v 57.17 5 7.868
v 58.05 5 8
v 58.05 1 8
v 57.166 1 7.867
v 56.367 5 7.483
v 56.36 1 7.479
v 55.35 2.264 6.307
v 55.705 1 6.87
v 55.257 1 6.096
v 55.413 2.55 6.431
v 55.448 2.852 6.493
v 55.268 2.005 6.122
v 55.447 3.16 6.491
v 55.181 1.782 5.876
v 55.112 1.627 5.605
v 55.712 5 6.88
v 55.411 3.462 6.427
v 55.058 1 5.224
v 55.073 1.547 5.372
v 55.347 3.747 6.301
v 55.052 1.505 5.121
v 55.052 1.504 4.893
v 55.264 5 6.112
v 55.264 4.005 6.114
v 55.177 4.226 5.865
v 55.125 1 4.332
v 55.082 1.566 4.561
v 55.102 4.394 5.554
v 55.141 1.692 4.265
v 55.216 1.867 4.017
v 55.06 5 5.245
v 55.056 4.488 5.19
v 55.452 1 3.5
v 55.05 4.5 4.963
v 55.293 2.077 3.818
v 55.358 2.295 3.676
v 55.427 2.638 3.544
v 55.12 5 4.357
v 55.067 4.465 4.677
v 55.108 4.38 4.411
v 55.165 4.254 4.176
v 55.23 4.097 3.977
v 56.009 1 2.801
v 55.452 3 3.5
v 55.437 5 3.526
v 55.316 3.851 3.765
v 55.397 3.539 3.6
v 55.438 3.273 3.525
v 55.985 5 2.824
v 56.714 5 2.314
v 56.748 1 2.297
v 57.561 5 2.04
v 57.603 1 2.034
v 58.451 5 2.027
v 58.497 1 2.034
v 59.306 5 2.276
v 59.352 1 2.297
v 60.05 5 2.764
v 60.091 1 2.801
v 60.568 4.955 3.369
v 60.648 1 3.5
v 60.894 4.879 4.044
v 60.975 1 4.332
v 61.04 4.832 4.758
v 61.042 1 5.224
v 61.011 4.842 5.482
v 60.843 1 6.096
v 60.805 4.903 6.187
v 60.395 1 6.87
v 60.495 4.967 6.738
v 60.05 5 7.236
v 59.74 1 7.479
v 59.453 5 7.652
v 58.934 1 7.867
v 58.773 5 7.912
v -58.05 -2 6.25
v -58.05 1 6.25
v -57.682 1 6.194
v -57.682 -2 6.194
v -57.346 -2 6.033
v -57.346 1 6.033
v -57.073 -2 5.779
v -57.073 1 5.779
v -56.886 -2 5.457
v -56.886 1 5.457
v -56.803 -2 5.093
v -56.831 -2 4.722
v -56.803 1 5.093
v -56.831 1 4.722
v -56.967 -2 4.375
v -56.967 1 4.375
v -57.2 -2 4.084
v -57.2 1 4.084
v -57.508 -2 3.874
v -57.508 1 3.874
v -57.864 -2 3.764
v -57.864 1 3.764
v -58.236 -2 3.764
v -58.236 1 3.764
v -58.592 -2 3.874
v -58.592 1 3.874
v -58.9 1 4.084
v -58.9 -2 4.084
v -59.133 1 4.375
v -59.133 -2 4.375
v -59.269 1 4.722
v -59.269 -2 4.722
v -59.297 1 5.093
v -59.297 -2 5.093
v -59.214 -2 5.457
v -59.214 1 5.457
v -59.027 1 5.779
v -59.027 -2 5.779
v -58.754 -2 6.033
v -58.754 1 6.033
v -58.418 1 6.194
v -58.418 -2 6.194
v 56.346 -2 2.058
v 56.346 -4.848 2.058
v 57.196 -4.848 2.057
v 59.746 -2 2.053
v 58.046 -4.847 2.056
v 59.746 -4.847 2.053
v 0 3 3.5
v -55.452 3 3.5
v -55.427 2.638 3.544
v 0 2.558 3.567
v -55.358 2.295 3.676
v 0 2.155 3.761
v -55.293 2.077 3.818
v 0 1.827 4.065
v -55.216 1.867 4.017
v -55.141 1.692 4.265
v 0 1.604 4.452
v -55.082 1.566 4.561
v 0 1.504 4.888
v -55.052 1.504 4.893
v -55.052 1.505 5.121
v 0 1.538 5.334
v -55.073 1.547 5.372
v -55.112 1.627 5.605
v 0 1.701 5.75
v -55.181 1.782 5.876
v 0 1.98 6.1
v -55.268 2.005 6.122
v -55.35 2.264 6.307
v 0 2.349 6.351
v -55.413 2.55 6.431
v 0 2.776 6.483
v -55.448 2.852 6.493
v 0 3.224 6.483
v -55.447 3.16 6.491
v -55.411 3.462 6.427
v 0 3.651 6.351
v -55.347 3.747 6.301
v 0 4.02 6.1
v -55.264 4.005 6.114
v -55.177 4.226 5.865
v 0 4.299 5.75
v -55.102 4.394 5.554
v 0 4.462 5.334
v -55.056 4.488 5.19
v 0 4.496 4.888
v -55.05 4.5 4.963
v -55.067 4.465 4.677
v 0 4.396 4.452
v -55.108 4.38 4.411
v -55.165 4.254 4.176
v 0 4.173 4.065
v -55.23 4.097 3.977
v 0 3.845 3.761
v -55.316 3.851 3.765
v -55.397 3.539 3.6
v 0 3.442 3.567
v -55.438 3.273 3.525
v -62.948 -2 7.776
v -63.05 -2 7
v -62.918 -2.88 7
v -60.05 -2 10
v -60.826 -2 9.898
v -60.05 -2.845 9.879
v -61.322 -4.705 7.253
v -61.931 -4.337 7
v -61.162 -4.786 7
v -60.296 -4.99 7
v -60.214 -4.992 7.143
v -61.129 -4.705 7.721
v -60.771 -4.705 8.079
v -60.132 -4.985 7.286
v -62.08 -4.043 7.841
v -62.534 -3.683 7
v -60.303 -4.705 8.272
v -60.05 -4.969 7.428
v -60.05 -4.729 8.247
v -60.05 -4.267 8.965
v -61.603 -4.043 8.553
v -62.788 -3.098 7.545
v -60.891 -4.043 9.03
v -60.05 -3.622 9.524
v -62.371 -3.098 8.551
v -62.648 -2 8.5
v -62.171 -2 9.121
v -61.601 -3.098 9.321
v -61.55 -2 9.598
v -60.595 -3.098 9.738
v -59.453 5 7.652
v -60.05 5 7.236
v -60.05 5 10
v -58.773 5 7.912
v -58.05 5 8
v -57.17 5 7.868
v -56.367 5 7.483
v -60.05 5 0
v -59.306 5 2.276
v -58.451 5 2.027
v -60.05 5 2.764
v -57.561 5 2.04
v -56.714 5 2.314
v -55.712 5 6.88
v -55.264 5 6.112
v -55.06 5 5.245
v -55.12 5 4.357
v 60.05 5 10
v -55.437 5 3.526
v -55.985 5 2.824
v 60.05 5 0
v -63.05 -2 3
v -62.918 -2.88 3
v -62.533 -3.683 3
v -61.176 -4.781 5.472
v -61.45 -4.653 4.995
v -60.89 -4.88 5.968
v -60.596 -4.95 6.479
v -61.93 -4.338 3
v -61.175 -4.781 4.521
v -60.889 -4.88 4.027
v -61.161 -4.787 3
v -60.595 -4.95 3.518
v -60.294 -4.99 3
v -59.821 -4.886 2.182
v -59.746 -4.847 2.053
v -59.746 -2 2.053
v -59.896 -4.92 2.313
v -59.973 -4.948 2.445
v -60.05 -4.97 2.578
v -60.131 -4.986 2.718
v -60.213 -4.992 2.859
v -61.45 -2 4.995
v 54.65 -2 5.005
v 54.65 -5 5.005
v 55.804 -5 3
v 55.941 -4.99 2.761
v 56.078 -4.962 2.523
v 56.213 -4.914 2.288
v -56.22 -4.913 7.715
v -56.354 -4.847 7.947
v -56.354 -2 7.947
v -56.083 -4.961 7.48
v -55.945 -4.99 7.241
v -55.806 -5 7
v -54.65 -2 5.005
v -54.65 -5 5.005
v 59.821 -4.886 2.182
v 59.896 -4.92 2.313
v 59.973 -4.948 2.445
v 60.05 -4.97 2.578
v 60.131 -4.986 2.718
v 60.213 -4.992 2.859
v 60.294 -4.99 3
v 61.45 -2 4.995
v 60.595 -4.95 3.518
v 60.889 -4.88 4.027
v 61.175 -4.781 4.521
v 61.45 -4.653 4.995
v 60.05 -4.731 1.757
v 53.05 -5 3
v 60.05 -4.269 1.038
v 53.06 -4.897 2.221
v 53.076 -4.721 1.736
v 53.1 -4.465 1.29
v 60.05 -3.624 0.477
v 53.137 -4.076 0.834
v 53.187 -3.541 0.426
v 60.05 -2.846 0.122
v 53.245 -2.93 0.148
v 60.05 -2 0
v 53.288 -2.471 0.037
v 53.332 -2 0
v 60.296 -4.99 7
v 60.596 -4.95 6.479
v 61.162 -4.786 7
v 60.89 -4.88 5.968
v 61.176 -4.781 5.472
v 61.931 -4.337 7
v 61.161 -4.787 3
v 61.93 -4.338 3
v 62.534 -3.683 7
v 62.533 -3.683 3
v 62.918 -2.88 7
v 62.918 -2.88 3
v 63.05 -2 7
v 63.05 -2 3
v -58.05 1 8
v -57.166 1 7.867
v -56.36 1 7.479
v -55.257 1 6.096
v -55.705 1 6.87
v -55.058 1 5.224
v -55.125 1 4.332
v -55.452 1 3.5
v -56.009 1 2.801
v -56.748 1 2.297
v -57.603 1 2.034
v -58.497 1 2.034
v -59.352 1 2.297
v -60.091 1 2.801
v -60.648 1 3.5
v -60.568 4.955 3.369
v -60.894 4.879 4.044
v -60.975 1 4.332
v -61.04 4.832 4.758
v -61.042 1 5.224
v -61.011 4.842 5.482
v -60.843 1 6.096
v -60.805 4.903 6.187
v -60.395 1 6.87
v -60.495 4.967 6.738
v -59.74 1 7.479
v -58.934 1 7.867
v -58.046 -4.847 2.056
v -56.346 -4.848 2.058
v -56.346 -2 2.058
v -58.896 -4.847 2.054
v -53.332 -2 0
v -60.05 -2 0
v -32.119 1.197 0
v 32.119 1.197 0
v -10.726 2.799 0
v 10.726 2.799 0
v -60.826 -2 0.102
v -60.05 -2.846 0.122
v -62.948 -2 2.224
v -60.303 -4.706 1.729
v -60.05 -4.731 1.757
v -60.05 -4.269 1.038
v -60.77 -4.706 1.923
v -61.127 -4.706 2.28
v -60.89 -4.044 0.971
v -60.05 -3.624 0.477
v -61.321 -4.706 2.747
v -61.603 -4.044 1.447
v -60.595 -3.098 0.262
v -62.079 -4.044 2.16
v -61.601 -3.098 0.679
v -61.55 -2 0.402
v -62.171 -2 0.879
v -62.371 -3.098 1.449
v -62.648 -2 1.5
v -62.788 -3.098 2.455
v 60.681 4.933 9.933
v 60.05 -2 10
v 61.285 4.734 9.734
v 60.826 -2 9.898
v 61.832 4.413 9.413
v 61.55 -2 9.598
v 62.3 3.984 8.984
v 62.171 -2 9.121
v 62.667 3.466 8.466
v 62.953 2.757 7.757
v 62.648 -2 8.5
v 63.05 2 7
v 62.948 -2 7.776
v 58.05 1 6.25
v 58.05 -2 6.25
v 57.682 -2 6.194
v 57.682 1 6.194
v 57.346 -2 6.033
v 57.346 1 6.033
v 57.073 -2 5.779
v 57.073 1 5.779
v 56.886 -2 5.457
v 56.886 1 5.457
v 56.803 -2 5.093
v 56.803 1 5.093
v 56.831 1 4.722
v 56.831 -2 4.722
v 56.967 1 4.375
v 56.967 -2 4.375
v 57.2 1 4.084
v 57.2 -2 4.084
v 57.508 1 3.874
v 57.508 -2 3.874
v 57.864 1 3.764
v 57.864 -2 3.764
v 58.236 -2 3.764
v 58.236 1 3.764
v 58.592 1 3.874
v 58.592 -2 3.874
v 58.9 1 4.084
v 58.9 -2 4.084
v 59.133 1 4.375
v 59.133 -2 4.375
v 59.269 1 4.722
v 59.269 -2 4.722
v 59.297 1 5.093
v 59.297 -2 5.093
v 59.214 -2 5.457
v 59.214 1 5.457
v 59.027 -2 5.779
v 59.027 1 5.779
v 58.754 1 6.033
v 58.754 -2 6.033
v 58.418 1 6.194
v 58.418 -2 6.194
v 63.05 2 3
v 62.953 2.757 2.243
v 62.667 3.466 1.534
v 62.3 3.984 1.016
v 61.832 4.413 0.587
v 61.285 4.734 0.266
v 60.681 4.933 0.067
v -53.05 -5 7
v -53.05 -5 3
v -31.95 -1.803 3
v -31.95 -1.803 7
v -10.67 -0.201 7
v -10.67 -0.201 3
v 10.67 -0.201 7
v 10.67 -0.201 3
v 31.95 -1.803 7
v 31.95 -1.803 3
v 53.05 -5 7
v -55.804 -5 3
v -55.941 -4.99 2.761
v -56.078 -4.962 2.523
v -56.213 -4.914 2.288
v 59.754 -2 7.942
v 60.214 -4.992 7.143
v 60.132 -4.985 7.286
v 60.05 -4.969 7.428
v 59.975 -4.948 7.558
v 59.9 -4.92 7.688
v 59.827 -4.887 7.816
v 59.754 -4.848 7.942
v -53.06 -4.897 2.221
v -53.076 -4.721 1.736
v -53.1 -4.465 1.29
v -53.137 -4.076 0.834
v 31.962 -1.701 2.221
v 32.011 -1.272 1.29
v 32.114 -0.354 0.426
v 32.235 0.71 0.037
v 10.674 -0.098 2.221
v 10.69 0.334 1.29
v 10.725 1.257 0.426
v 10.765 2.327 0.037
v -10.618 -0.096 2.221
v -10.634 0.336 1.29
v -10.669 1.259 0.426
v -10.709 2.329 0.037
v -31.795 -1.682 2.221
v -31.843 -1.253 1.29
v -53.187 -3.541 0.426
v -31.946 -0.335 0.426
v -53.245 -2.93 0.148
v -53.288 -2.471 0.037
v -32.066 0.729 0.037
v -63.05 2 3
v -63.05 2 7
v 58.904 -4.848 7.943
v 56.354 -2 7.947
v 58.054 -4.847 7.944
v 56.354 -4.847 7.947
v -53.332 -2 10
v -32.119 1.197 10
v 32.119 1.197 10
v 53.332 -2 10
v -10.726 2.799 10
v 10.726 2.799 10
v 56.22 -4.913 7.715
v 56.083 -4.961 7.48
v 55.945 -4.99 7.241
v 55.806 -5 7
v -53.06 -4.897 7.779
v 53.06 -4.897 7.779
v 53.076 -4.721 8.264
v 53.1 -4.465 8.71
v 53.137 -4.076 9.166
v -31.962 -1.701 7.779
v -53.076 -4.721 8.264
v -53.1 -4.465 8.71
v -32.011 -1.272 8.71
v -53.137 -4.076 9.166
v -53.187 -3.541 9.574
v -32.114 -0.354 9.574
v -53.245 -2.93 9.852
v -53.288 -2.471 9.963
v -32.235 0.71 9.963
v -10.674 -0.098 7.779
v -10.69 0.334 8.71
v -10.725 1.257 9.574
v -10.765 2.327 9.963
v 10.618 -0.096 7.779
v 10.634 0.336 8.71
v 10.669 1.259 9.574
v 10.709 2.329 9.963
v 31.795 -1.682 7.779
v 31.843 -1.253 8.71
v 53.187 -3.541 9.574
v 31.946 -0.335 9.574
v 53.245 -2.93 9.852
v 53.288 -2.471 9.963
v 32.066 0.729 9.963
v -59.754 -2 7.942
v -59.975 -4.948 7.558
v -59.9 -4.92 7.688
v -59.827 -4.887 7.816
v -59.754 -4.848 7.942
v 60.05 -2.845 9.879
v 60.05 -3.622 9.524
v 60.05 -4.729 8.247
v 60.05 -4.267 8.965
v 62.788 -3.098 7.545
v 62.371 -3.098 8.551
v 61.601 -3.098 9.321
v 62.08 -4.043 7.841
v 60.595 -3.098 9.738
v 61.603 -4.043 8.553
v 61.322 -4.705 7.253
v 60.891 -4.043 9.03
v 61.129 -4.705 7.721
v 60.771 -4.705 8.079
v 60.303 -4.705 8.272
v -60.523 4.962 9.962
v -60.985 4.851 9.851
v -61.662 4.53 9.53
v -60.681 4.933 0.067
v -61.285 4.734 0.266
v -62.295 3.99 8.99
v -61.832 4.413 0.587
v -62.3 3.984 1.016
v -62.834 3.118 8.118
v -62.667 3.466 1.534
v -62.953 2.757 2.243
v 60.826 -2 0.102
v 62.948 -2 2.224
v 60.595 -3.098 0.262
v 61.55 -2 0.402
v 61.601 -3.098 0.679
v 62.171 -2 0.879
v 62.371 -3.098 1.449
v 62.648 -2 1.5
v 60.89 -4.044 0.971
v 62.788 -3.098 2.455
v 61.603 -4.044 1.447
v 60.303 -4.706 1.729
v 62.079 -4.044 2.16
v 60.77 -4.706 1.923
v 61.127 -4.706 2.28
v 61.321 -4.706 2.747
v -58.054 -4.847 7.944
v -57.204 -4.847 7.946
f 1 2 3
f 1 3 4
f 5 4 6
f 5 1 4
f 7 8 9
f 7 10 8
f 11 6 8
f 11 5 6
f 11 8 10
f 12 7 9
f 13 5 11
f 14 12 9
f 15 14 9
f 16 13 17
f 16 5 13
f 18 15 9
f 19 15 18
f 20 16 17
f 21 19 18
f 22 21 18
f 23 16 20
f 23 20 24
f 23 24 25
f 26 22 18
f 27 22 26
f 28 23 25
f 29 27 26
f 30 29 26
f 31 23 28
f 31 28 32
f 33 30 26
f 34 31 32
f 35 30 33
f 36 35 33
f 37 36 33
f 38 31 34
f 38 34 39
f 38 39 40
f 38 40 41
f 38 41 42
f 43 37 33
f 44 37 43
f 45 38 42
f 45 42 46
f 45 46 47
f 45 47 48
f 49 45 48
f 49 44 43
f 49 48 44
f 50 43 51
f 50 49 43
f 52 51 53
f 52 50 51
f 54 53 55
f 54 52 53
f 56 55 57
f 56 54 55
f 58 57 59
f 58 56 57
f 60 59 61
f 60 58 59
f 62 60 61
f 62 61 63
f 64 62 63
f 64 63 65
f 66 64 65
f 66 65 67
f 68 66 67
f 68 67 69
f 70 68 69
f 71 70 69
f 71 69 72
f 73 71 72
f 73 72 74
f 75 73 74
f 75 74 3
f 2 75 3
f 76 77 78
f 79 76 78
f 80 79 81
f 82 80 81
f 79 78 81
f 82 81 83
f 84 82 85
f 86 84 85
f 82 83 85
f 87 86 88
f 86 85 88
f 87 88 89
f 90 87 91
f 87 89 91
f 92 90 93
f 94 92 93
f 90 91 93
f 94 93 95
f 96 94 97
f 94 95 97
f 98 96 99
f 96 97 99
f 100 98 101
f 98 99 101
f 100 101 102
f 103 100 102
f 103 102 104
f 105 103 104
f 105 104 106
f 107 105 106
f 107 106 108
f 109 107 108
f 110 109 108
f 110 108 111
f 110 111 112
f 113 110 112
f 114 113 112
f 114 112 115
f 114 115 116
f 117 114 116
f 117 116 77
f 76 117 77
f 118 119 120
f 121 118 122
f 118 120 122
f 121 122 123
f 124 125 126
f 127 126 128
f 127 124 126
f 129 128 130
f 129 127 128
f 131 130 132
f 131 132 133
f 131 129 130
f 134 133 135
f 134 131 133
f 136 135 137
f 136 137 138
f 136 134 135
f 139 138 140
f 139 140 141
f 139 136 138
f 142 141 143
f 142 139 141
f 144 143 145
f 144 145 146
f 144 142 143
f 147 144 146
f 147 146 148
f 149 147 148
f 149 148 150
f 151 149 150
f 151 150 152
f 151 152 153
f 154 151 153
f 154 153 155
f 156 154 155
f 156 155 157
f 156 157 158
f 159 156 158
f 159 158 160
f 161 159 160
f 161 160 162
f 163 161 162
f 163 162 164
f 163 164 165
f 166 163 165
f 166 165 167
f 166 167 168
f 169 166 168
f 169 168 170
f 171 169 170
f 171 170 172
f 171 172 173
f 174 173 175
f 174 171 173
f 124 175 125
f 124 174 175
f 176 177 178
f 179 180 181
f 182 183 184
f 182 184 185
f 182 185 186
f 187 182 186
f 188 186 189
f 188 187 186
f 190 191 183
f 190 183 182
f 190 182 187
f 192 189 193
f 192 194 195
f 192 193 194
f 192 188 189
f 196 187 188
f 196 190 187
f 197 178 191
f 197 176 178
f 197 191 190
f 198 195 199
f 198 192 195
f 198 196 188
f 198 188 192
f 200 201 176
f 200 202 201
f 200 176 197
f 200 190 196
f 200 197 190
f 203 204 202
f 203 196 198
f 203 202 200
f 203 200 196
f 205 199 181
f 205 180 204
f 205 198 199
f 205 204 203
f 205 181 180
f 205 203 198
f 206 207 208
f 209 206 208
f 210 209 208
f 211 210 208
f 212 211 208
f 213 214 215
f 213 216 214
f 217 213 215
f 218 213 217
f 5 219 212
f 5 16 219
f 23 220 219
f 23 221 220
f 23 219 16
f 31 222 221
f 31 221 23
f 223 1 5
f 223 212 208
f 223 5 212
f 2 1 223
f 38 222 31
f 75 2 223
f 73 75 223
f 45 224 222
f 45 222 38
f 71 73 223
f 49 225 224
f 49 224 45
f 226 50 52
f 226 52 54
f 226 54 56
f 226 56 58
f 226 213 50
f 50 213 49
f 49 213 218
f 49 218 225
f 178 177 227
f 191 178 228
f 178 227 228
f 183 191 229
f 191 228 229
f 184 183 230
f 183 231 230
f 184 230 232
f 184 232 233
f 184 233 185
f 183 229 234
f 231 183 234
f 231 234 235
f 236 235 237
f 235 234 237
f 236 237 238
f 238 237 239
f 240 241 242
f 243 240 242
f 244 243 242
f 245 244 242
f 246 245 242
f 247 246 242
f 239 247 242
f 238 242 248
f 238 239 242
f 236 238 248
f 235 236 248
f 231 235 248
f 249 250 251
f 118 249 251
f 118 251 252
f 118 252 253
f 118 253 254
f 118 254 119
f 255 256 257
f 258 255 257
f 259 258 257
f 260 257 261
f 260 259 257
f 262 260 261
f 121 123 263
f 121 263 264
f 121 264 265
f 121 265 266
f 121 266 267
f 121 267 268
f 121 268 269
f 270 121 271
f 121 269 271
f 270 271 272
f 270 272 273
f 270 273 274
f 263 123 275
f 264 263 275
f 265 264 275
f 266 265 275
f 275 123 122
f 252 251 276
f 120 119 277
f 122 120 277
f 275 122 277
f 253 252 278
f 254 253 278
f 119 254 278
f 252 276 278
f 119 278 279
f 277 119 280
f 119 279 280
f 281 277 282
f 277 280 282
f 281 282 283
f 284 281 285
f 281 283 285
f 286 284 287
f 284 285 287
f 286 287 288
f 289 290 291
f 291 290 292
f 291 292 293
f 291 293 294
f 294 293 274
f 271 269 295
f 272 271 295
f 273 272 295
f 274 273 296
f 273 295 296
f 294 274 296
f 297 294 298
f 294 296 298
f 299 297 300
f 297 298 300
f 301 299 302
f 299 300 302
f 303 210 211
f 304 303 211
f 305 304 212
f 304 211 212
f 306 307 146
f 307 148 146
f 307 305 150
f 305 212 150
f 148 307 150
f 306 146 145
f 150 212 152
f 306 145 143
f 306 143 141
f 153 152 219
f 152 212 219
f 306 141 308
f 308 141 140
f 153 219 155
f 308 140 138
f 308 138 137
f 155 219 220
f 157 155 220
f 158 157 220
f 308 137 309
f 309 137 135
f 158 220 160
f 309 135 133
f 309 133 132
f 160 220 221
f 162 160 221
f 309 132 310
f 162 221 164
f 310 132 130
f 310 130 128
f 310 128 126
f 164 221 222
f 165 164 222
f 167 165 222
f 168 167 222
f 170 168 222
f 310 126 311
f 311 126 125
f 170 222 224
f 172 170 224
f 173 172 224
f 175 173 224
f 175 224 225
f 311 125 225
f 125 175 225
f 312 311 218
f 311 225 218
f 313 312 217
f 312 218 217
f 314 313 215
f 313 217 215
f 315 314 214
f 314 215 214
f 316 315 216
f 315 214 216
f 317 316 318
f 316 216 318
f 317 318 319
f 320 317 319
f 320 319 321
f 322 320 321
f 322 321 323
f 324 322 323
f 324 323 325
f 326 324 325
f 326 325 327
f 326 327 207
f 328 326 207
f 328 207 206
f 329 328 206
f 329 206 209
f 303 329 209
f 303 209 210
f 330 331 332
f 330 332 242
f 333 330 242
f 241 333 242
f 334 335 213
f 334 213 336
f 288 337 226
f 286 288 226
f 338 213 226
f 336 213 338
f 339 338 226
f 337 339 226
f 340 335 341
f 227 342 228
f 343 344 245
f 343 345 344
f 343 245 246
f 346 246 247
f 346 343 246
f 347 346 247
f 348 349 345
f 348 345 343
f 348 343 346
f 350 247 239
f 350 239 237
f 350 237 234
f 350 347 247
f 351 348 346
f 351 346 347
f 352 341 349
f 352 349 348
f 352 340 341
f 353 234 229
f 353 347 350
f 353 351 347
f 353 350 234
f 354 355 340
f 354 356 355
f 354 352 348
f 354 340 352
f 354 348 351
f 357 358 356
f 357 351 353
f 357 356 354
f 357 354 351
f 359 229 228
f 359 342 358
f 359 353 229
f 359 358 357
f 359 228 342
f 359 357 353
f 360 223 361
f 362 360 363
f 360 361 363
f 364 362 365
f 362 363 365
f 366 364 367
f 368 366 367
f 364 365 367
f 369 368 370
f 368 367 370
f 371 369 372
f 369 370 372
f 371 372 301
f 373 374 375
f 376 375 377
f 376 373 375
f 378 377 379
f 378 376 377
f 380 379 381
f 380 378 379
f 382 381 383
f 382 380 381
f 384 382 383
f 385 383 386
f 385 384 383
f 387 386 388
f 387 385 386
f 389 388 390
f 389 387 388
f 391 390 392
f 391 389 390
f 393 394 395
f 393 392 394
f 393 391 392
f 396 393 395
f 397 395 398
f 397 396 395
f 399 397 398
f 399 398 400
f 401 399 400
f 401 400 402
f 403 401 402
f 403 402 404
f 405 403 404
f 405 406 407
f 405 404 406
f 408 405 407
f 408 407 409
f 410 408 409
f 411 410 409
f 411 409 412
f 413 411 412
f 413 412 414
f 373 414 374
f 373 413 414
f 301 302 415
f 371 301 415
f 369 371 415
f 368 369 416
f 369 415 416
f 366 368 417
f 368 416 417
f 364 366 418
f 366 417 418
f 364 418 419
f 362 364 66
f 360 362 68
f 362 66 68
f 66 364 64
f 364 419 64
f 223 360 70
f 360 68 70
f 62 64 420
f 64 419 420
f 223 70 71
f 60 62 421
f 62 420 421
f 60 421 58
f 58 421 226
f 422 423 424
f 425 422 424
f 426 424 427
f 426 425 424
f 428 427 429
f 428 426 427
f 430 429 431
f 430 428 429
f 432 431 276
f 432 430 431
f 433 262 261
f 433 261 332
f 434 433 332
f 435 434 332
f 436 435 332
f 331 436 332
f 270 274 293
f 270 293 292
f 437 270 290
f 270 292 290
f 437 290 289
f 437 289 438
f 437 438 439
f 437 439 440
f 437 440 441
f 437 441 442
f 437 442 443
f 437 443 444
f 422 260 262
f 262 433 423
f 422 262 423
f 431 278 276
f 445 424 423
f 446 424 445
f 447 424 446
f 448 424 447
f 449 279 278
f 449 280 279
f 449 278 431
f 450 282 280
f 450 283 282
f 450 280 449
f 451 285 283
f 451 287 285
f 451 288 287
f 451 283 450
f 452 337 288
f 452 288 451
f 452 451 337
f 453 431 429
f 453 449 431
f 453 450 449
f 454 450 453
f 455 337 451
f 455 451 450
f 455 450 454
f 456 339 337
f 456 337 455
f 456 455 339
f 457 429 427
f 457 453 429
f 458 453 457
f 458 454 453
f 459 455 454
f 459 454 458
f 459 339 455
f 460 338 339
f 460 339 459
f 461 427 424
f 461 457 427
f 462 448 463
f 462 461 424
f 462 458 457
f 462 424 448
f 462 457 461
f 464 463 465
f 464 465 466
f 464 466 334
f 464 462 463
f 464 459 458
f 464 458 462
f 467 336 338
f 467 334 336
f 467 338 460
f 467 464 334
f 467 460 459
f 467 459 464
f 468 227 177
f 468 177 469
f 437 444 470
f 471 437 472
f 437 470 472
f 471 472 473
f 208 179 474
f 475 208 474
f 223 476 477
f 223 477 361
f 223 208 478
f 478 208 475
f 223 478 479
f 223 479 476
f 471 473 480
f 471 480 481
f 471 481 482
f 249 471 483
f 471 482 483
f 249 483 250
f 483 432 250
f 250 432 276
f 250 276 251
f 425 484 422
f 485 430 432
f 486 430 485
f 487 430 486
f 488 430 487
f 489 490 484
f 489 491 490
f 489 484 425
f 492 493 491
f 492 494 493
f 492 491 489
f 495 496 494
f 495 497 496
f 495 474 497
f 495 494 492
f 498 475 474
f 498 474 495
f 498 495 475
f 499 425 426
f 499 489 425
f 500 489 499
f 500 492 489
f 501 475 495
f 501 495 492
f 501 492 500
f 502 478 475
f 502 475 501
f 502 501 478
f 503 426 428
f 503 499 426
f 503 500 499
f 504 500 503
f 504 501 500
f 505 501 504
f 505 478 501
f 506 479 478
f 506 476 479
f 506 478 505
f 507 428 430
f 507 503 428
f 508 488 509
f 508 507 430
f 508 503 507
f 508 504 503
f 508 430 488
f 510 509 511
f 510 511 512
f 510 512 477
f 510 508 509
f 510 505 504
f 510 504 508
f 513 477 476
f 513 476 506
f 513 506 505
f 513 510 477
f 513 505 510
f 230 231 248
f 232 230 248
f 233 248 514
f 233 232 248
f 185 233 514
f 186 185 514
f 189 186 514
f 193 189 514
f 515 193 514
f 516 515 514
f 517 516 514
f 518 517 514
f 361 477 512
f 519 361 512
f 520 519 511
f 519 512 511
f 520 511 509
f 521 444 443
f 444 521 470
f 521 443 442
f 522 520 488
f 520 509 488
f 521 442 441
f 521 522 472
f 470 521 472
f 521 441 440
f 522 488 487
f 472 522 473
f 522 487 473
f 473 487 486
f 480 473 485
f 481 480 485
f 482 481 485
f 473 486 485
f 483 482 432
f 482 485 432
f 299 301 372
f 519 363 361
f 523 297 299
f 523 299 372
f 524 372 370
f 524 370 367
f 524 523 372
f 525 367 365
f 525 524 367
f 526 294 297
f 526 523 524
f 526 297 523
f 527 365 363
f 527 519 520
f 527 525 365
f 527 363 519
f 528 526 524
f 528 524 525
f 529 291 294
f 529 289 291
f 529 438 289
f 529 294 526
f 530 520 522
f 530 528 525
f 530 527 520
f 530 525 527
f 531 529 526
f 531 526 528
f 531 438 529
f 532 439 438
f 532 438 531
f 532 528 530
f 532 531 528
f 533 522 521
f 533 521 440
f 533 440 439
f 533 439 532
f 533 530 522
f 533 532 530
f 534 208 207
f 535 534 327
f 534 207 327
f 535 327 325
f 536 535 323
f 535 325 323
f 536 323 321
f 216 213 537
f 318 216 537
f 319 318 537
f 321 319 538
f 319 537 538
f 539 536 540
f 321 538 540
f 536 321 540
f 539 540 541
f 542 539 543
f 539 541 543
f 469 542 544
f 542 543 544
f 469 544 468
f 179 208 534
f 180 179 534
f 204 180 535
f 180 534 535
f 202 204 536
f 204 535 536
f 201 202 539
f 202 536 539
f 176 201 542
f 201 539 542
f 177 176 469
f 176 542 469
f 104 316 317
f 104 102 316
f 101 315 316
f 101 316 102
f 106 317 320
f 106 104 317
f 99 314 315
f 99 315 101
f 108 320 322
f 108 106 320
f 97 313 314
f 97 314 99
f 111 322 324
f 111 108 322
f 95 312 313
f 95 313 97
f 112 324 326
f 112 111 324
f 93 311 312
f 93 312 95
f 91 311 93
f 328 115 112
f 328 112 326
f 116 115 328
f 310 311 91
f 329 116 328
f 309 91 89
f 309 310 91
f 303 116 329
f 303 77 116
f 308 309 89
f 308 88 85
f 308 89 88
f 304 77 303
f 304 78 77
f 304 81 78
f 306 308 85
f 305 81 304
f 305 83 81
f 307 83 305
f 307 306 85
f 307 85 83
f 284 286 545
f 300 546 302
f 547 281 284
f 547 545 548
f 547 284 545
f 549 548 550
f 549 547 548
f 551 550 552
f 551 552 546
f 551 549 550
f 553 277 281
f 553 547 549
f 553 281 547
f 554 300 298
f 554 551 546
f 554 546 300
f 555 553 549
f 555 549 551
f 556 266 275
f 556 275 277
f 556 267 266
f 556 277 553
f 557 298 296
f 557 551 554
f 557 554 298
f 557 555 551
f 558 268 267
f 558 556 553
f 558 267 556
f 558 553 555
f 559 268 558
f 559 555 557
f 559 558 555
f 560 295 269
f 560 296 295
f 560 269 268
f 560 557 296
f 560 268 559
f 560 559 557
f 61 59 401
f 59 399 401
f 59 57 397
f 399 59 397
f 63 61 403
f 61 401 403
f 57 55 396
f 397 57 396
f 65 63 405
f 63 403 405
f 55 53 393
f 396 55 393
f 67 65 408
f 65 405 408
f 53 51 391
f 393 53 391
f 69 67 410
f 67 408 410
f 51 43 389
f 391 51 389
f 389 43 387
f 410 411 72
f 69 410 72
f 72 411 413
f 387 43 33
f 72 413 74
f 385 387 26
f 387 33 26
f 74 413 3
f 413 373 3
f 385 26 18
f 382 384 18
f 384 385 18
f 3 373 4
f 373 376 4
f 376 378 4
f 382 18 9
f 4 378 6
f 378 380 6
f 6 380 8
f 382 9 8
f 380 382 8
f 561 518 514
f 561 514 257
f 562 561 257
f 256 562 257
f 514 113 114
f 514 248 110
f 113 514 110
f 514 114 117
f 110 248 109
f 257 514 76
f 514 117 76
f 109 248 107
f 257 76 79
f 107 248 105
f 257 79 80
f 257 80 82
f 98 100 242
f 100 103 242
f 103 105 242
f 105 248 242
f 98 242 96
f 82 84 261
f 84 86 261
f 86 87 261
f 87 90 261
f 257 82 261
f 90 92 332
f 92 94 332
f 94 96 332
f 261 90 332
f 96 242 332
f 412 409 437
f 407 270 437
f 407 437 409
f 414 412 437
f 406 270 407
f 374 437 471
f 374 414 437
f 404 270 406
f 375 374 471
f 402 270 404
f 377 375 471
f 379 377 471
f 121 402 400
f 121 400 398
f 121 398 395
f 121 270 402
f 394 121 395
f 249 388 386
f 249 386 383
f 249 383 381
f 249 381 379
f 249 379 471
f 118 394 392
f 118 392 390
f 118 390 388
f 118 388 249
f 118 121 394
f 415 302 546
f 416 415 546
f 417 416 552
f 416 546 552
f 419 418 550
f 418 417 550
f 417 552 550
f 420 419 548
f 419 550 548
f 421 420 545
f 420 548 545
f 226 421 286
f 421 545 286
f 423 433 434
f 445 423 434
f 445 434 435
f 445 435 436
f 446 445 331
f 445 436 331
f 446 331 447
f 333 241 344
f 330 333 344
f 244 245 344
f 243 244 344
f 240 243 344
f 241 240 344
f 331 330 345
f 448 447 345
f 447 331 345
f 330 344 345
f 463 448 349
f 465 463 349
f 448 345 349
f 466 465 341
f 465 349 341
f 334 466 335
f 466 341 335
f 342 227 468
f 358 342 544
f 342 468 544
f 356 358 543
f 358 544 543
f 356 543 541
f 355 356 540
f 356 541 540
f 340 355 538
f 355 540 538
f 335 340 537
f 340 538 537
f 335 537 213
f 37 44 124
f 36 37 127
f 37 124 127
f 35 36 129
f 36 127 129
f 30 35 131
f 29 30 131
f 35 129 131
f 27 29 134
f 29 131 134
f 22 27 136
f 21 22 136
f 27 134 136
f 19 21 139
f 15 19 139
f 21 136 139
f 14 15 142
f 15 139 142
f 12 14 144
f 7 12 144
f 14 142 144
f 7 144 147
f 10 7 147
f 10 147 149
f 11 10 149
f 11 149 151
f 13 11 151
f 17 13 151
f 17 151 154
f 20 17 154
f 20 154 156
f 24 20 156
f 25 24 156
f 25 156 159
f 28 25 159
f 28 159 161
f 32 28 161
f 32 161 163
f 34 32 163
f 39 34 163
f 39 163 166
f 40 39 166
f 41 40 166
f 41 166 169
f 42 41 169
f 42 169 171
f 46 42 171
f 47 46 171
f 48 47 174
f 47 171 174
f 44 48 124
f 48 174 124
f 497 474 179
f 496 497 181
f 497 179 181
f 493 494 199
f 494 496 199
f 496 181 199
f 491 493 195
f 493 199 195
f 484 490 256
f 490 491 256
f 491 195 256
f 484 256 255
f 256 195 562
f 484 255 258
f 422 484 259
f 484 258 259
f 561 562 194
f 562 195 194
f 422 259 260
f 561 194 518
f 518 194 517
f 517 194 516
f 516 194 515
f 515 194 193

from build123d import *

# Parameters (mm, degrees)
ESBO_O1_W                              = 126.1
ESBO_O1_H                              = 10
RESSALTO_EXTRUS_O1_DEPTH               = 10
CORTE_EXTRUS_O1_DEPTH                  = 65.033604459
CORTE_EXTRUS_O3_DEPTH                  = 3
ESBO_O4_R                              = 3
CORTE_EXTRUS_O4_DEPTH                  = 4
ESBO_O5_R                              = 1.25
CORTE_EXTRUS_O5_DEPTH                  = 65.11943933
CORTE_EXTRUS_O9_REACH                  = 66.034
CORTE_EXTRUS_O9_END_RADIUS             = 3
ESBO_O6_R                              = 1.5
CORTE_EXTRUS_O9_DIRECTION_2_REACH      = 66.034
CORTE_EXTRUS_O9_DIRECTION_2_END_RADIUS = 3
FILETE1_R                              = 3
FILETE2_R                              = 3


with BuildPart() as part:
    # Esboço1 → Ressalto-extrusão1 (new body)
    with BuildSketch(Plane.XY):
        Rectangle(ESBO_O1_W, ESBO_O1_H)
    extrude(amount=RESSALTO_EXTRUS_O1_DEPTH)

    # Esboço2 → Corte-extrusão1 (cut, through all)
    with BuildSketch(Plane.XY.offset(10)):
        with BuildLine():
            Line((-291.82946292, -50.413684991), (-53.05, -5))
            ThreePointArc((-53.05, -5), (0, 0), (53.05, -5))
            Line((53.05, -5), (291.82946292, -50.413684991))
            Line((291.82946292, -50.413684991), (291.82946292, -536.533154655))
            Line((291.82946292, -536.533154655), (-291.82946292, -536.533154655))
            Line((-291.82946292, -536.533154655), (-291.82946292, -50.413684991))
        make_face()
    extrude(amount=-CORTE_EXTRUS_O1_DEPTH, mode=Mode.SUBTRACT)

    # Esboço3 → Corte-extrusão3 (cut)
    with BuildSketch(Plane(origin=(0, -5, 0), x_dir=(1, 0, 0), z_dir=(0, 1, 0))):
        Polygon((-56.354018507, -7.946802806), (-54.650003164, -5.004638346), (-56.345984657, -2.05783554), (-59.745981493, -2.053197194), (-61.449996836, -4.995361654), (-59.754015343, -7.94216446), align=None)
    corte_extrus_o3 = extrude(amount=CORTE_EXTRUS_O3_DEPTH, mode=Mode.SUBTRACT)

    # Esboço4 → Corte-extrusão4 (cut)
    with BuildSketch(Plane(origin=(0, 5, 0), x_dir=(1, 0, 0), z_dir=(0, 1, 0))):
        with Locations(Location((-58.05, -5, 0), (0, 0, 270))):
            Circle(ESBO_O4_R)
    corte_extrus_o4 = extrude(amount=-CORTE_EXTRUS_O4_DEPTH, mode=Mode.SUBTRACT)

    # Esboço5 → Corte-extrusão5 (cut, through all)
    with BuildSketch(Plane(origin=(0, 1, 0), x_dir=(1, 0, 0), z_dir=(0, 1, 0))):
        with Locations(Location((-58.05, -5, 0), (0, 0, 270))):
            Circle(ESBO_O5_R)
    corte_extrus_o5 = extrude(amount=-CORTE_EXTRUS_O5_DEPTH, mode=Mode.SUBTRACT)

    # Espelhar2: Corte-extrusão3, Corte-extrusão4, Corte-extrusão5 across plane
    add(corte_extrus_o3.mirror(Plane(origin=(0, 0, 0), x_dir=(0, 0, 1), z_dir=(1, 0, 0))), mode=Mode.SUBTRACT)
    add(corte_extrus_o4.mirror(Plane(origin=(0, 0, 0), x_dir=(0, 0, 1), z_dir=(1, 0, 0))), mode=Mode.SUBTRACT)
    add(corte_extrus_o5.mirror(Plane(origin=(0, 0, 0), x_dir=(0, 0, 1), z_dir=(1, 0, 0))), mode=Mode.SUBTRACT)

    # Corte-extrusão9: up to this cylinder (the profile starts outside it)
    corte_extrus_o9_end = Plane(origin=(58.05, 3, 5), z_dir=(0, 1, 0)) * Cylinder(CORTE_EXTRUS_O9_END_RADIUS, 139.068, mode=Mode.PRIVATE)
    # Esboço6 → Corte-extrusão9 (cut, up to the surface)
    with BuildSketch(Plane.ZY, mode=Mode.PRIVATE) as corte_extrus_o9_sk1:
        with Locations(Location((5, 3, 0), (0, 0, 180))):
            Circle(ESBO_O6_R)
    corte_extrus_o9_tool1 = extrude(corte_extrus_o9_sk1.sketch, amount=-CORTE_EXTRUS_O9_REACH, mode=Mode.PRIVATE) - corte_extrus_o9_end
    add(corte_extrus_o9_tool1.solids().sort_by_distance((0, 3, 5))[0], mode=Mode.SUBTRACT)

    # Corte-extrusão9 direction 2: up to this cylinder (the profile starts outside it)
    corte_extrus_o9_direction_2_end = Plane(origin=(-58.05, 3, 5), z_dir=(0, 1, 0)) * Cylinder(CORTE_EXTRUS_O9_DIRECTION_2_END_RADIUS, 139.068, mode=Mode.PRIVATE)
    # Esboço6 → Corte-extrusão9 direction 2 (cut, up to the surface)
    with BuildSketch(Plane.ZY, mode=Mode.PRIVATE) as corte_extrus_o9_direction_2_sk1:
        with Locations(Location((5, 3, 0), (0, 0, 180))):
            Circle(ESBO_O6_R)
    corte_extrus_o9_direction_2_tool1 = extrude(corte_extrus_o9_direction_2_sk1.sketch, amount=CORTE_EXTRUS_O9_DIRECTION_2_REACH, mode=Mode.PRIVATE) - corte_extrus_o9_direction_2_end
    add(corte_extrus_o9_direction_2_tool1.solids().sort_by_distance((0, 3, 5))[0], mode=Mode.SUBTRACT)

    # Filete1
    # the kernel refuses this fillet: 3 mm, written as the material it takes off along each edge
    with BuildSketch(Plane(origin=(-63.05, 12.5, 10), x_dir=(1, 0, 0), z_dir=(0, -1, 0)), Plane(origin=(-63.05, 12.5, 0), x_dir=(0, 0, 1), z_dir=(0, -1, 0)), Plane(origin=(63.05, -12.5, 0), x_dir=(0, 0, 1), z_dir=(0, 1, 0)), Plane(origin=(-63.05, 5, -7.5), x_dir=(1, 0, 0), z_dir=(0, 0, 1)), Plane(origin=(63.05, 5, -7.5), x_dir=(0, -1, 0), z_dir=(0, 0, 1))) as filete1_piece_1:
        with BuildLine():
            CenterArc((FILETE1_R, -FILETE1_R), FILETE1_R, 90, 90)
            Line((0, -FILETE1_R), (0, 0))
            Line((0, 0), (FILETE1_R, 0))
        make_face()
    extrude(amount=25, mode=Mode.SUBTRACT)
    with BuildSketch(Plane(origin=(63.05, -12.5, 10), x_dir=(0, 0, -1), z_dir=(0, 1, 0))) as filete1_piece_2:
        with BuildLine():
            CenterArc((FILETE1_R, FILETE1_R), FILETE1_R, 180, 90)
            Line((0, FILETE1_R), (0, 0))
            Line((0, 0), (FILETE1_R, 0))
        make_face()
    extrude(amount=25, mode=Mode.SUBTRACT)

    # Filete2
    # the kernel refuses this fillet: 3 mm, written as the material it takes off along each edge
    with BuildSketch(Plane(origin=(45.55, -5, 0), x_dir=(0, 1, 0), z_dir=(1, 0, 0)), Plane(origin=(-60.05, -5, 10), x_dir=(0, 0, -1), z_dir=(1, 0, 0))) as filete2_piece_1:
        with BuildLine():
            CenterArc((FILETE2_R, FILETE2_R), FILETE2_R, 180, 90)
            Line((0, FILETE2_R), (0, 0))
            Line((0, 0), (FILETE2_R, 0))
        make_face()
    extrude(amount=14.5, mode=Mode.SUBTRACT)
    with BuildSketch(Plane(origin=(45.55, -5, 10), x_dir=(0, 1, 0), z_dir=(1, 0, 0)), Plane(origin=(-60.05, -5, 0), x_dir=(0, 0, 1), z_dir=(1, 0, 0))) as filete2_piece_2:
        with BuildLine():
            CenterArc((FILETE2_R, -FILETE2_R), FILETE2_R, 90, 90)
            Line((0, -FILETE2_R), (0, 0))
            Line((0, 0), (FILETE2_R, 0))
        make_face()
    extrude(amount=14.5, mode=Mode.SUBTRACT)
    with BuildSketch(Plane(origin=(0, -283.93025, 0), x_dir=(0.21272383034714434, 0.9771123640617998, 0), z_dir=(0.9771123640617998, -0.21272383034714434, 0))) as filete2_piece_3:
        with BuildLine():
            CenterArc((283.93025 + FILETE2_R, FILETE2_R), FILETE2_R, 180, 90)
            Line((283.93025, FILETE2_R), (283.93025, 0))
            Line((283.93025, 0), (283.93025 + FILETE2_R, 0))
        make_face()
    revolve(axis=Axis((0, -283.93025, 0), (0, 0, 1)), revolution_arc=24.564047203, mode=Mode.SUBTRACT)
    with BuildSketch(Plane(origin=(0, -283.93025, 10), x_dir=(-0.21272383034714376, 0.9771123640618, 0), z_dir=(-0.9771123640618, -0.21272383034714376, 0))) as filete2_piece_4:
        with BuildLine():
            CenterArc((283.93025 + FILETE2_R, FILETE2_R), FILETE2_R, 180, 90)
            Line((283.93025 + FILETE2_R, 0), (283.93025, 0))
            Line((283.93025, 0), (283.93025, FILETE2_R))
        make_face()
    revolve(axis=Axis((0, -283.93025, 10), (0, 0, -1)), revolution_arc=24.564047203, mode=Mode.SUBTRACT)
    with BuildSketch(Plane(origin=(-60.05, -5, 3), x_dir=(0, 0, -1), z_dir=(1, 0, 0))) as filete2_piece_5:
        with BuildLine():
            CenterArc((3 - FILETE2_R, FILETE2_R), FILETE2_R, 270, 90)
            Line((3, FILETE2_R), (3, 0))
            Line((3, 0), (3 - FILETE2_R, 0))
        make_face()
    revolve(axis=Axis((-60.05, -5, 3), (0, 1, 0)), revolution_arc=90, mode=Mode.SUBTRACT)
    with BuildSketch(Plane(origin=(-63.05, -5, 3), x_dir=(1, 0, 0), z_dir=(0, 0, 1))) as filete2_piece_6:
        with BuildLine():
            CenterArc((FILETE2_R, FILETE2_R), FILETE2_R, 180, 90)
            Line((0, FILETE2_R), (0, 0))
            Line((0, 0), (FILETE2_R, 0))
        make_face()
    extrude(amount=4, mode=Mode.SUBTRACT)
    with BuildSketch(Plane(origin=(-60.05, -5, 7), x_dir=(-1, 0, 0), z_dir=(0, 0, -1))) as filete2_piece_7:
        with BuildLine():
            CenterArc((3 - FILETE2_R, FILETE2_R), FILETE2_R, 270, 90)
            Line((3, FILETE2_R), (3, 0))
            Line((3, 0), (3 - FILETE2_R, 0))
        make_face()
    revolve(axis=Axis((-60.05, -5, 7), (0, 1, 0)), revolution_arc=90, mode=Mode.SUBTRACT)
    with BuildSketch(Plane(origin=(60.05, -5, 7), x_dir=(1, 0, 0), z_dir=(0, 0, -1))) as filete2_piece_8:
        with BuildLine():
            CenterArc((3 - FILETE2_R, -FILETE2_R), FILETE2_R, 0, 90)
            Line((3, -FILETE2_R), (3, 0))
            Line((3, 0), (3 - FILETE2_R, 0))
        make_face()
    revolve(axis=Axis((60.05, -5, 7), (0, -1, 0)), revolution_arc=90, mode=Mode.SUBTRACT)
    with BuildSketch(Plane(origin=(63.05, -5, 3), x_dir=(-1, 0, 0), z_dir=(0, 0, 1))) as filete2_piece_9:
        with BuildLine():
            CenterArc((FILETE2_R, -FILETE2_R), FILETE2_R, 90, 90)
            Line((0, -FILETE2_R), (0, 0))
            Line((0, 0), (FILETE2_R, 0))
        make_face()
    extrude(amount=4, mode=Mode.SUBTRACT)
    with BuildSketch(Plane(origin=(60.05, -5, 3), x_dir=(0, 0, -1), z_dir=(-1, 0, 0))) as filete2_piece_10:
        with BuildLine():
            CenterArc((3 - FILETE2_R, -FILETE2_R), FILETE2_R, 0, 90)
            Line((3 - FILETE2_R, 0), (3, 0))
            Line((3, 0), (3, -FILETE2_R))
        make_face()
    revolve(axis=Axis((60.05, -5, 3), (0, -1, 0)), revolution_arc=90, mode=Mode.SUBTRACT)


solid = part.part
